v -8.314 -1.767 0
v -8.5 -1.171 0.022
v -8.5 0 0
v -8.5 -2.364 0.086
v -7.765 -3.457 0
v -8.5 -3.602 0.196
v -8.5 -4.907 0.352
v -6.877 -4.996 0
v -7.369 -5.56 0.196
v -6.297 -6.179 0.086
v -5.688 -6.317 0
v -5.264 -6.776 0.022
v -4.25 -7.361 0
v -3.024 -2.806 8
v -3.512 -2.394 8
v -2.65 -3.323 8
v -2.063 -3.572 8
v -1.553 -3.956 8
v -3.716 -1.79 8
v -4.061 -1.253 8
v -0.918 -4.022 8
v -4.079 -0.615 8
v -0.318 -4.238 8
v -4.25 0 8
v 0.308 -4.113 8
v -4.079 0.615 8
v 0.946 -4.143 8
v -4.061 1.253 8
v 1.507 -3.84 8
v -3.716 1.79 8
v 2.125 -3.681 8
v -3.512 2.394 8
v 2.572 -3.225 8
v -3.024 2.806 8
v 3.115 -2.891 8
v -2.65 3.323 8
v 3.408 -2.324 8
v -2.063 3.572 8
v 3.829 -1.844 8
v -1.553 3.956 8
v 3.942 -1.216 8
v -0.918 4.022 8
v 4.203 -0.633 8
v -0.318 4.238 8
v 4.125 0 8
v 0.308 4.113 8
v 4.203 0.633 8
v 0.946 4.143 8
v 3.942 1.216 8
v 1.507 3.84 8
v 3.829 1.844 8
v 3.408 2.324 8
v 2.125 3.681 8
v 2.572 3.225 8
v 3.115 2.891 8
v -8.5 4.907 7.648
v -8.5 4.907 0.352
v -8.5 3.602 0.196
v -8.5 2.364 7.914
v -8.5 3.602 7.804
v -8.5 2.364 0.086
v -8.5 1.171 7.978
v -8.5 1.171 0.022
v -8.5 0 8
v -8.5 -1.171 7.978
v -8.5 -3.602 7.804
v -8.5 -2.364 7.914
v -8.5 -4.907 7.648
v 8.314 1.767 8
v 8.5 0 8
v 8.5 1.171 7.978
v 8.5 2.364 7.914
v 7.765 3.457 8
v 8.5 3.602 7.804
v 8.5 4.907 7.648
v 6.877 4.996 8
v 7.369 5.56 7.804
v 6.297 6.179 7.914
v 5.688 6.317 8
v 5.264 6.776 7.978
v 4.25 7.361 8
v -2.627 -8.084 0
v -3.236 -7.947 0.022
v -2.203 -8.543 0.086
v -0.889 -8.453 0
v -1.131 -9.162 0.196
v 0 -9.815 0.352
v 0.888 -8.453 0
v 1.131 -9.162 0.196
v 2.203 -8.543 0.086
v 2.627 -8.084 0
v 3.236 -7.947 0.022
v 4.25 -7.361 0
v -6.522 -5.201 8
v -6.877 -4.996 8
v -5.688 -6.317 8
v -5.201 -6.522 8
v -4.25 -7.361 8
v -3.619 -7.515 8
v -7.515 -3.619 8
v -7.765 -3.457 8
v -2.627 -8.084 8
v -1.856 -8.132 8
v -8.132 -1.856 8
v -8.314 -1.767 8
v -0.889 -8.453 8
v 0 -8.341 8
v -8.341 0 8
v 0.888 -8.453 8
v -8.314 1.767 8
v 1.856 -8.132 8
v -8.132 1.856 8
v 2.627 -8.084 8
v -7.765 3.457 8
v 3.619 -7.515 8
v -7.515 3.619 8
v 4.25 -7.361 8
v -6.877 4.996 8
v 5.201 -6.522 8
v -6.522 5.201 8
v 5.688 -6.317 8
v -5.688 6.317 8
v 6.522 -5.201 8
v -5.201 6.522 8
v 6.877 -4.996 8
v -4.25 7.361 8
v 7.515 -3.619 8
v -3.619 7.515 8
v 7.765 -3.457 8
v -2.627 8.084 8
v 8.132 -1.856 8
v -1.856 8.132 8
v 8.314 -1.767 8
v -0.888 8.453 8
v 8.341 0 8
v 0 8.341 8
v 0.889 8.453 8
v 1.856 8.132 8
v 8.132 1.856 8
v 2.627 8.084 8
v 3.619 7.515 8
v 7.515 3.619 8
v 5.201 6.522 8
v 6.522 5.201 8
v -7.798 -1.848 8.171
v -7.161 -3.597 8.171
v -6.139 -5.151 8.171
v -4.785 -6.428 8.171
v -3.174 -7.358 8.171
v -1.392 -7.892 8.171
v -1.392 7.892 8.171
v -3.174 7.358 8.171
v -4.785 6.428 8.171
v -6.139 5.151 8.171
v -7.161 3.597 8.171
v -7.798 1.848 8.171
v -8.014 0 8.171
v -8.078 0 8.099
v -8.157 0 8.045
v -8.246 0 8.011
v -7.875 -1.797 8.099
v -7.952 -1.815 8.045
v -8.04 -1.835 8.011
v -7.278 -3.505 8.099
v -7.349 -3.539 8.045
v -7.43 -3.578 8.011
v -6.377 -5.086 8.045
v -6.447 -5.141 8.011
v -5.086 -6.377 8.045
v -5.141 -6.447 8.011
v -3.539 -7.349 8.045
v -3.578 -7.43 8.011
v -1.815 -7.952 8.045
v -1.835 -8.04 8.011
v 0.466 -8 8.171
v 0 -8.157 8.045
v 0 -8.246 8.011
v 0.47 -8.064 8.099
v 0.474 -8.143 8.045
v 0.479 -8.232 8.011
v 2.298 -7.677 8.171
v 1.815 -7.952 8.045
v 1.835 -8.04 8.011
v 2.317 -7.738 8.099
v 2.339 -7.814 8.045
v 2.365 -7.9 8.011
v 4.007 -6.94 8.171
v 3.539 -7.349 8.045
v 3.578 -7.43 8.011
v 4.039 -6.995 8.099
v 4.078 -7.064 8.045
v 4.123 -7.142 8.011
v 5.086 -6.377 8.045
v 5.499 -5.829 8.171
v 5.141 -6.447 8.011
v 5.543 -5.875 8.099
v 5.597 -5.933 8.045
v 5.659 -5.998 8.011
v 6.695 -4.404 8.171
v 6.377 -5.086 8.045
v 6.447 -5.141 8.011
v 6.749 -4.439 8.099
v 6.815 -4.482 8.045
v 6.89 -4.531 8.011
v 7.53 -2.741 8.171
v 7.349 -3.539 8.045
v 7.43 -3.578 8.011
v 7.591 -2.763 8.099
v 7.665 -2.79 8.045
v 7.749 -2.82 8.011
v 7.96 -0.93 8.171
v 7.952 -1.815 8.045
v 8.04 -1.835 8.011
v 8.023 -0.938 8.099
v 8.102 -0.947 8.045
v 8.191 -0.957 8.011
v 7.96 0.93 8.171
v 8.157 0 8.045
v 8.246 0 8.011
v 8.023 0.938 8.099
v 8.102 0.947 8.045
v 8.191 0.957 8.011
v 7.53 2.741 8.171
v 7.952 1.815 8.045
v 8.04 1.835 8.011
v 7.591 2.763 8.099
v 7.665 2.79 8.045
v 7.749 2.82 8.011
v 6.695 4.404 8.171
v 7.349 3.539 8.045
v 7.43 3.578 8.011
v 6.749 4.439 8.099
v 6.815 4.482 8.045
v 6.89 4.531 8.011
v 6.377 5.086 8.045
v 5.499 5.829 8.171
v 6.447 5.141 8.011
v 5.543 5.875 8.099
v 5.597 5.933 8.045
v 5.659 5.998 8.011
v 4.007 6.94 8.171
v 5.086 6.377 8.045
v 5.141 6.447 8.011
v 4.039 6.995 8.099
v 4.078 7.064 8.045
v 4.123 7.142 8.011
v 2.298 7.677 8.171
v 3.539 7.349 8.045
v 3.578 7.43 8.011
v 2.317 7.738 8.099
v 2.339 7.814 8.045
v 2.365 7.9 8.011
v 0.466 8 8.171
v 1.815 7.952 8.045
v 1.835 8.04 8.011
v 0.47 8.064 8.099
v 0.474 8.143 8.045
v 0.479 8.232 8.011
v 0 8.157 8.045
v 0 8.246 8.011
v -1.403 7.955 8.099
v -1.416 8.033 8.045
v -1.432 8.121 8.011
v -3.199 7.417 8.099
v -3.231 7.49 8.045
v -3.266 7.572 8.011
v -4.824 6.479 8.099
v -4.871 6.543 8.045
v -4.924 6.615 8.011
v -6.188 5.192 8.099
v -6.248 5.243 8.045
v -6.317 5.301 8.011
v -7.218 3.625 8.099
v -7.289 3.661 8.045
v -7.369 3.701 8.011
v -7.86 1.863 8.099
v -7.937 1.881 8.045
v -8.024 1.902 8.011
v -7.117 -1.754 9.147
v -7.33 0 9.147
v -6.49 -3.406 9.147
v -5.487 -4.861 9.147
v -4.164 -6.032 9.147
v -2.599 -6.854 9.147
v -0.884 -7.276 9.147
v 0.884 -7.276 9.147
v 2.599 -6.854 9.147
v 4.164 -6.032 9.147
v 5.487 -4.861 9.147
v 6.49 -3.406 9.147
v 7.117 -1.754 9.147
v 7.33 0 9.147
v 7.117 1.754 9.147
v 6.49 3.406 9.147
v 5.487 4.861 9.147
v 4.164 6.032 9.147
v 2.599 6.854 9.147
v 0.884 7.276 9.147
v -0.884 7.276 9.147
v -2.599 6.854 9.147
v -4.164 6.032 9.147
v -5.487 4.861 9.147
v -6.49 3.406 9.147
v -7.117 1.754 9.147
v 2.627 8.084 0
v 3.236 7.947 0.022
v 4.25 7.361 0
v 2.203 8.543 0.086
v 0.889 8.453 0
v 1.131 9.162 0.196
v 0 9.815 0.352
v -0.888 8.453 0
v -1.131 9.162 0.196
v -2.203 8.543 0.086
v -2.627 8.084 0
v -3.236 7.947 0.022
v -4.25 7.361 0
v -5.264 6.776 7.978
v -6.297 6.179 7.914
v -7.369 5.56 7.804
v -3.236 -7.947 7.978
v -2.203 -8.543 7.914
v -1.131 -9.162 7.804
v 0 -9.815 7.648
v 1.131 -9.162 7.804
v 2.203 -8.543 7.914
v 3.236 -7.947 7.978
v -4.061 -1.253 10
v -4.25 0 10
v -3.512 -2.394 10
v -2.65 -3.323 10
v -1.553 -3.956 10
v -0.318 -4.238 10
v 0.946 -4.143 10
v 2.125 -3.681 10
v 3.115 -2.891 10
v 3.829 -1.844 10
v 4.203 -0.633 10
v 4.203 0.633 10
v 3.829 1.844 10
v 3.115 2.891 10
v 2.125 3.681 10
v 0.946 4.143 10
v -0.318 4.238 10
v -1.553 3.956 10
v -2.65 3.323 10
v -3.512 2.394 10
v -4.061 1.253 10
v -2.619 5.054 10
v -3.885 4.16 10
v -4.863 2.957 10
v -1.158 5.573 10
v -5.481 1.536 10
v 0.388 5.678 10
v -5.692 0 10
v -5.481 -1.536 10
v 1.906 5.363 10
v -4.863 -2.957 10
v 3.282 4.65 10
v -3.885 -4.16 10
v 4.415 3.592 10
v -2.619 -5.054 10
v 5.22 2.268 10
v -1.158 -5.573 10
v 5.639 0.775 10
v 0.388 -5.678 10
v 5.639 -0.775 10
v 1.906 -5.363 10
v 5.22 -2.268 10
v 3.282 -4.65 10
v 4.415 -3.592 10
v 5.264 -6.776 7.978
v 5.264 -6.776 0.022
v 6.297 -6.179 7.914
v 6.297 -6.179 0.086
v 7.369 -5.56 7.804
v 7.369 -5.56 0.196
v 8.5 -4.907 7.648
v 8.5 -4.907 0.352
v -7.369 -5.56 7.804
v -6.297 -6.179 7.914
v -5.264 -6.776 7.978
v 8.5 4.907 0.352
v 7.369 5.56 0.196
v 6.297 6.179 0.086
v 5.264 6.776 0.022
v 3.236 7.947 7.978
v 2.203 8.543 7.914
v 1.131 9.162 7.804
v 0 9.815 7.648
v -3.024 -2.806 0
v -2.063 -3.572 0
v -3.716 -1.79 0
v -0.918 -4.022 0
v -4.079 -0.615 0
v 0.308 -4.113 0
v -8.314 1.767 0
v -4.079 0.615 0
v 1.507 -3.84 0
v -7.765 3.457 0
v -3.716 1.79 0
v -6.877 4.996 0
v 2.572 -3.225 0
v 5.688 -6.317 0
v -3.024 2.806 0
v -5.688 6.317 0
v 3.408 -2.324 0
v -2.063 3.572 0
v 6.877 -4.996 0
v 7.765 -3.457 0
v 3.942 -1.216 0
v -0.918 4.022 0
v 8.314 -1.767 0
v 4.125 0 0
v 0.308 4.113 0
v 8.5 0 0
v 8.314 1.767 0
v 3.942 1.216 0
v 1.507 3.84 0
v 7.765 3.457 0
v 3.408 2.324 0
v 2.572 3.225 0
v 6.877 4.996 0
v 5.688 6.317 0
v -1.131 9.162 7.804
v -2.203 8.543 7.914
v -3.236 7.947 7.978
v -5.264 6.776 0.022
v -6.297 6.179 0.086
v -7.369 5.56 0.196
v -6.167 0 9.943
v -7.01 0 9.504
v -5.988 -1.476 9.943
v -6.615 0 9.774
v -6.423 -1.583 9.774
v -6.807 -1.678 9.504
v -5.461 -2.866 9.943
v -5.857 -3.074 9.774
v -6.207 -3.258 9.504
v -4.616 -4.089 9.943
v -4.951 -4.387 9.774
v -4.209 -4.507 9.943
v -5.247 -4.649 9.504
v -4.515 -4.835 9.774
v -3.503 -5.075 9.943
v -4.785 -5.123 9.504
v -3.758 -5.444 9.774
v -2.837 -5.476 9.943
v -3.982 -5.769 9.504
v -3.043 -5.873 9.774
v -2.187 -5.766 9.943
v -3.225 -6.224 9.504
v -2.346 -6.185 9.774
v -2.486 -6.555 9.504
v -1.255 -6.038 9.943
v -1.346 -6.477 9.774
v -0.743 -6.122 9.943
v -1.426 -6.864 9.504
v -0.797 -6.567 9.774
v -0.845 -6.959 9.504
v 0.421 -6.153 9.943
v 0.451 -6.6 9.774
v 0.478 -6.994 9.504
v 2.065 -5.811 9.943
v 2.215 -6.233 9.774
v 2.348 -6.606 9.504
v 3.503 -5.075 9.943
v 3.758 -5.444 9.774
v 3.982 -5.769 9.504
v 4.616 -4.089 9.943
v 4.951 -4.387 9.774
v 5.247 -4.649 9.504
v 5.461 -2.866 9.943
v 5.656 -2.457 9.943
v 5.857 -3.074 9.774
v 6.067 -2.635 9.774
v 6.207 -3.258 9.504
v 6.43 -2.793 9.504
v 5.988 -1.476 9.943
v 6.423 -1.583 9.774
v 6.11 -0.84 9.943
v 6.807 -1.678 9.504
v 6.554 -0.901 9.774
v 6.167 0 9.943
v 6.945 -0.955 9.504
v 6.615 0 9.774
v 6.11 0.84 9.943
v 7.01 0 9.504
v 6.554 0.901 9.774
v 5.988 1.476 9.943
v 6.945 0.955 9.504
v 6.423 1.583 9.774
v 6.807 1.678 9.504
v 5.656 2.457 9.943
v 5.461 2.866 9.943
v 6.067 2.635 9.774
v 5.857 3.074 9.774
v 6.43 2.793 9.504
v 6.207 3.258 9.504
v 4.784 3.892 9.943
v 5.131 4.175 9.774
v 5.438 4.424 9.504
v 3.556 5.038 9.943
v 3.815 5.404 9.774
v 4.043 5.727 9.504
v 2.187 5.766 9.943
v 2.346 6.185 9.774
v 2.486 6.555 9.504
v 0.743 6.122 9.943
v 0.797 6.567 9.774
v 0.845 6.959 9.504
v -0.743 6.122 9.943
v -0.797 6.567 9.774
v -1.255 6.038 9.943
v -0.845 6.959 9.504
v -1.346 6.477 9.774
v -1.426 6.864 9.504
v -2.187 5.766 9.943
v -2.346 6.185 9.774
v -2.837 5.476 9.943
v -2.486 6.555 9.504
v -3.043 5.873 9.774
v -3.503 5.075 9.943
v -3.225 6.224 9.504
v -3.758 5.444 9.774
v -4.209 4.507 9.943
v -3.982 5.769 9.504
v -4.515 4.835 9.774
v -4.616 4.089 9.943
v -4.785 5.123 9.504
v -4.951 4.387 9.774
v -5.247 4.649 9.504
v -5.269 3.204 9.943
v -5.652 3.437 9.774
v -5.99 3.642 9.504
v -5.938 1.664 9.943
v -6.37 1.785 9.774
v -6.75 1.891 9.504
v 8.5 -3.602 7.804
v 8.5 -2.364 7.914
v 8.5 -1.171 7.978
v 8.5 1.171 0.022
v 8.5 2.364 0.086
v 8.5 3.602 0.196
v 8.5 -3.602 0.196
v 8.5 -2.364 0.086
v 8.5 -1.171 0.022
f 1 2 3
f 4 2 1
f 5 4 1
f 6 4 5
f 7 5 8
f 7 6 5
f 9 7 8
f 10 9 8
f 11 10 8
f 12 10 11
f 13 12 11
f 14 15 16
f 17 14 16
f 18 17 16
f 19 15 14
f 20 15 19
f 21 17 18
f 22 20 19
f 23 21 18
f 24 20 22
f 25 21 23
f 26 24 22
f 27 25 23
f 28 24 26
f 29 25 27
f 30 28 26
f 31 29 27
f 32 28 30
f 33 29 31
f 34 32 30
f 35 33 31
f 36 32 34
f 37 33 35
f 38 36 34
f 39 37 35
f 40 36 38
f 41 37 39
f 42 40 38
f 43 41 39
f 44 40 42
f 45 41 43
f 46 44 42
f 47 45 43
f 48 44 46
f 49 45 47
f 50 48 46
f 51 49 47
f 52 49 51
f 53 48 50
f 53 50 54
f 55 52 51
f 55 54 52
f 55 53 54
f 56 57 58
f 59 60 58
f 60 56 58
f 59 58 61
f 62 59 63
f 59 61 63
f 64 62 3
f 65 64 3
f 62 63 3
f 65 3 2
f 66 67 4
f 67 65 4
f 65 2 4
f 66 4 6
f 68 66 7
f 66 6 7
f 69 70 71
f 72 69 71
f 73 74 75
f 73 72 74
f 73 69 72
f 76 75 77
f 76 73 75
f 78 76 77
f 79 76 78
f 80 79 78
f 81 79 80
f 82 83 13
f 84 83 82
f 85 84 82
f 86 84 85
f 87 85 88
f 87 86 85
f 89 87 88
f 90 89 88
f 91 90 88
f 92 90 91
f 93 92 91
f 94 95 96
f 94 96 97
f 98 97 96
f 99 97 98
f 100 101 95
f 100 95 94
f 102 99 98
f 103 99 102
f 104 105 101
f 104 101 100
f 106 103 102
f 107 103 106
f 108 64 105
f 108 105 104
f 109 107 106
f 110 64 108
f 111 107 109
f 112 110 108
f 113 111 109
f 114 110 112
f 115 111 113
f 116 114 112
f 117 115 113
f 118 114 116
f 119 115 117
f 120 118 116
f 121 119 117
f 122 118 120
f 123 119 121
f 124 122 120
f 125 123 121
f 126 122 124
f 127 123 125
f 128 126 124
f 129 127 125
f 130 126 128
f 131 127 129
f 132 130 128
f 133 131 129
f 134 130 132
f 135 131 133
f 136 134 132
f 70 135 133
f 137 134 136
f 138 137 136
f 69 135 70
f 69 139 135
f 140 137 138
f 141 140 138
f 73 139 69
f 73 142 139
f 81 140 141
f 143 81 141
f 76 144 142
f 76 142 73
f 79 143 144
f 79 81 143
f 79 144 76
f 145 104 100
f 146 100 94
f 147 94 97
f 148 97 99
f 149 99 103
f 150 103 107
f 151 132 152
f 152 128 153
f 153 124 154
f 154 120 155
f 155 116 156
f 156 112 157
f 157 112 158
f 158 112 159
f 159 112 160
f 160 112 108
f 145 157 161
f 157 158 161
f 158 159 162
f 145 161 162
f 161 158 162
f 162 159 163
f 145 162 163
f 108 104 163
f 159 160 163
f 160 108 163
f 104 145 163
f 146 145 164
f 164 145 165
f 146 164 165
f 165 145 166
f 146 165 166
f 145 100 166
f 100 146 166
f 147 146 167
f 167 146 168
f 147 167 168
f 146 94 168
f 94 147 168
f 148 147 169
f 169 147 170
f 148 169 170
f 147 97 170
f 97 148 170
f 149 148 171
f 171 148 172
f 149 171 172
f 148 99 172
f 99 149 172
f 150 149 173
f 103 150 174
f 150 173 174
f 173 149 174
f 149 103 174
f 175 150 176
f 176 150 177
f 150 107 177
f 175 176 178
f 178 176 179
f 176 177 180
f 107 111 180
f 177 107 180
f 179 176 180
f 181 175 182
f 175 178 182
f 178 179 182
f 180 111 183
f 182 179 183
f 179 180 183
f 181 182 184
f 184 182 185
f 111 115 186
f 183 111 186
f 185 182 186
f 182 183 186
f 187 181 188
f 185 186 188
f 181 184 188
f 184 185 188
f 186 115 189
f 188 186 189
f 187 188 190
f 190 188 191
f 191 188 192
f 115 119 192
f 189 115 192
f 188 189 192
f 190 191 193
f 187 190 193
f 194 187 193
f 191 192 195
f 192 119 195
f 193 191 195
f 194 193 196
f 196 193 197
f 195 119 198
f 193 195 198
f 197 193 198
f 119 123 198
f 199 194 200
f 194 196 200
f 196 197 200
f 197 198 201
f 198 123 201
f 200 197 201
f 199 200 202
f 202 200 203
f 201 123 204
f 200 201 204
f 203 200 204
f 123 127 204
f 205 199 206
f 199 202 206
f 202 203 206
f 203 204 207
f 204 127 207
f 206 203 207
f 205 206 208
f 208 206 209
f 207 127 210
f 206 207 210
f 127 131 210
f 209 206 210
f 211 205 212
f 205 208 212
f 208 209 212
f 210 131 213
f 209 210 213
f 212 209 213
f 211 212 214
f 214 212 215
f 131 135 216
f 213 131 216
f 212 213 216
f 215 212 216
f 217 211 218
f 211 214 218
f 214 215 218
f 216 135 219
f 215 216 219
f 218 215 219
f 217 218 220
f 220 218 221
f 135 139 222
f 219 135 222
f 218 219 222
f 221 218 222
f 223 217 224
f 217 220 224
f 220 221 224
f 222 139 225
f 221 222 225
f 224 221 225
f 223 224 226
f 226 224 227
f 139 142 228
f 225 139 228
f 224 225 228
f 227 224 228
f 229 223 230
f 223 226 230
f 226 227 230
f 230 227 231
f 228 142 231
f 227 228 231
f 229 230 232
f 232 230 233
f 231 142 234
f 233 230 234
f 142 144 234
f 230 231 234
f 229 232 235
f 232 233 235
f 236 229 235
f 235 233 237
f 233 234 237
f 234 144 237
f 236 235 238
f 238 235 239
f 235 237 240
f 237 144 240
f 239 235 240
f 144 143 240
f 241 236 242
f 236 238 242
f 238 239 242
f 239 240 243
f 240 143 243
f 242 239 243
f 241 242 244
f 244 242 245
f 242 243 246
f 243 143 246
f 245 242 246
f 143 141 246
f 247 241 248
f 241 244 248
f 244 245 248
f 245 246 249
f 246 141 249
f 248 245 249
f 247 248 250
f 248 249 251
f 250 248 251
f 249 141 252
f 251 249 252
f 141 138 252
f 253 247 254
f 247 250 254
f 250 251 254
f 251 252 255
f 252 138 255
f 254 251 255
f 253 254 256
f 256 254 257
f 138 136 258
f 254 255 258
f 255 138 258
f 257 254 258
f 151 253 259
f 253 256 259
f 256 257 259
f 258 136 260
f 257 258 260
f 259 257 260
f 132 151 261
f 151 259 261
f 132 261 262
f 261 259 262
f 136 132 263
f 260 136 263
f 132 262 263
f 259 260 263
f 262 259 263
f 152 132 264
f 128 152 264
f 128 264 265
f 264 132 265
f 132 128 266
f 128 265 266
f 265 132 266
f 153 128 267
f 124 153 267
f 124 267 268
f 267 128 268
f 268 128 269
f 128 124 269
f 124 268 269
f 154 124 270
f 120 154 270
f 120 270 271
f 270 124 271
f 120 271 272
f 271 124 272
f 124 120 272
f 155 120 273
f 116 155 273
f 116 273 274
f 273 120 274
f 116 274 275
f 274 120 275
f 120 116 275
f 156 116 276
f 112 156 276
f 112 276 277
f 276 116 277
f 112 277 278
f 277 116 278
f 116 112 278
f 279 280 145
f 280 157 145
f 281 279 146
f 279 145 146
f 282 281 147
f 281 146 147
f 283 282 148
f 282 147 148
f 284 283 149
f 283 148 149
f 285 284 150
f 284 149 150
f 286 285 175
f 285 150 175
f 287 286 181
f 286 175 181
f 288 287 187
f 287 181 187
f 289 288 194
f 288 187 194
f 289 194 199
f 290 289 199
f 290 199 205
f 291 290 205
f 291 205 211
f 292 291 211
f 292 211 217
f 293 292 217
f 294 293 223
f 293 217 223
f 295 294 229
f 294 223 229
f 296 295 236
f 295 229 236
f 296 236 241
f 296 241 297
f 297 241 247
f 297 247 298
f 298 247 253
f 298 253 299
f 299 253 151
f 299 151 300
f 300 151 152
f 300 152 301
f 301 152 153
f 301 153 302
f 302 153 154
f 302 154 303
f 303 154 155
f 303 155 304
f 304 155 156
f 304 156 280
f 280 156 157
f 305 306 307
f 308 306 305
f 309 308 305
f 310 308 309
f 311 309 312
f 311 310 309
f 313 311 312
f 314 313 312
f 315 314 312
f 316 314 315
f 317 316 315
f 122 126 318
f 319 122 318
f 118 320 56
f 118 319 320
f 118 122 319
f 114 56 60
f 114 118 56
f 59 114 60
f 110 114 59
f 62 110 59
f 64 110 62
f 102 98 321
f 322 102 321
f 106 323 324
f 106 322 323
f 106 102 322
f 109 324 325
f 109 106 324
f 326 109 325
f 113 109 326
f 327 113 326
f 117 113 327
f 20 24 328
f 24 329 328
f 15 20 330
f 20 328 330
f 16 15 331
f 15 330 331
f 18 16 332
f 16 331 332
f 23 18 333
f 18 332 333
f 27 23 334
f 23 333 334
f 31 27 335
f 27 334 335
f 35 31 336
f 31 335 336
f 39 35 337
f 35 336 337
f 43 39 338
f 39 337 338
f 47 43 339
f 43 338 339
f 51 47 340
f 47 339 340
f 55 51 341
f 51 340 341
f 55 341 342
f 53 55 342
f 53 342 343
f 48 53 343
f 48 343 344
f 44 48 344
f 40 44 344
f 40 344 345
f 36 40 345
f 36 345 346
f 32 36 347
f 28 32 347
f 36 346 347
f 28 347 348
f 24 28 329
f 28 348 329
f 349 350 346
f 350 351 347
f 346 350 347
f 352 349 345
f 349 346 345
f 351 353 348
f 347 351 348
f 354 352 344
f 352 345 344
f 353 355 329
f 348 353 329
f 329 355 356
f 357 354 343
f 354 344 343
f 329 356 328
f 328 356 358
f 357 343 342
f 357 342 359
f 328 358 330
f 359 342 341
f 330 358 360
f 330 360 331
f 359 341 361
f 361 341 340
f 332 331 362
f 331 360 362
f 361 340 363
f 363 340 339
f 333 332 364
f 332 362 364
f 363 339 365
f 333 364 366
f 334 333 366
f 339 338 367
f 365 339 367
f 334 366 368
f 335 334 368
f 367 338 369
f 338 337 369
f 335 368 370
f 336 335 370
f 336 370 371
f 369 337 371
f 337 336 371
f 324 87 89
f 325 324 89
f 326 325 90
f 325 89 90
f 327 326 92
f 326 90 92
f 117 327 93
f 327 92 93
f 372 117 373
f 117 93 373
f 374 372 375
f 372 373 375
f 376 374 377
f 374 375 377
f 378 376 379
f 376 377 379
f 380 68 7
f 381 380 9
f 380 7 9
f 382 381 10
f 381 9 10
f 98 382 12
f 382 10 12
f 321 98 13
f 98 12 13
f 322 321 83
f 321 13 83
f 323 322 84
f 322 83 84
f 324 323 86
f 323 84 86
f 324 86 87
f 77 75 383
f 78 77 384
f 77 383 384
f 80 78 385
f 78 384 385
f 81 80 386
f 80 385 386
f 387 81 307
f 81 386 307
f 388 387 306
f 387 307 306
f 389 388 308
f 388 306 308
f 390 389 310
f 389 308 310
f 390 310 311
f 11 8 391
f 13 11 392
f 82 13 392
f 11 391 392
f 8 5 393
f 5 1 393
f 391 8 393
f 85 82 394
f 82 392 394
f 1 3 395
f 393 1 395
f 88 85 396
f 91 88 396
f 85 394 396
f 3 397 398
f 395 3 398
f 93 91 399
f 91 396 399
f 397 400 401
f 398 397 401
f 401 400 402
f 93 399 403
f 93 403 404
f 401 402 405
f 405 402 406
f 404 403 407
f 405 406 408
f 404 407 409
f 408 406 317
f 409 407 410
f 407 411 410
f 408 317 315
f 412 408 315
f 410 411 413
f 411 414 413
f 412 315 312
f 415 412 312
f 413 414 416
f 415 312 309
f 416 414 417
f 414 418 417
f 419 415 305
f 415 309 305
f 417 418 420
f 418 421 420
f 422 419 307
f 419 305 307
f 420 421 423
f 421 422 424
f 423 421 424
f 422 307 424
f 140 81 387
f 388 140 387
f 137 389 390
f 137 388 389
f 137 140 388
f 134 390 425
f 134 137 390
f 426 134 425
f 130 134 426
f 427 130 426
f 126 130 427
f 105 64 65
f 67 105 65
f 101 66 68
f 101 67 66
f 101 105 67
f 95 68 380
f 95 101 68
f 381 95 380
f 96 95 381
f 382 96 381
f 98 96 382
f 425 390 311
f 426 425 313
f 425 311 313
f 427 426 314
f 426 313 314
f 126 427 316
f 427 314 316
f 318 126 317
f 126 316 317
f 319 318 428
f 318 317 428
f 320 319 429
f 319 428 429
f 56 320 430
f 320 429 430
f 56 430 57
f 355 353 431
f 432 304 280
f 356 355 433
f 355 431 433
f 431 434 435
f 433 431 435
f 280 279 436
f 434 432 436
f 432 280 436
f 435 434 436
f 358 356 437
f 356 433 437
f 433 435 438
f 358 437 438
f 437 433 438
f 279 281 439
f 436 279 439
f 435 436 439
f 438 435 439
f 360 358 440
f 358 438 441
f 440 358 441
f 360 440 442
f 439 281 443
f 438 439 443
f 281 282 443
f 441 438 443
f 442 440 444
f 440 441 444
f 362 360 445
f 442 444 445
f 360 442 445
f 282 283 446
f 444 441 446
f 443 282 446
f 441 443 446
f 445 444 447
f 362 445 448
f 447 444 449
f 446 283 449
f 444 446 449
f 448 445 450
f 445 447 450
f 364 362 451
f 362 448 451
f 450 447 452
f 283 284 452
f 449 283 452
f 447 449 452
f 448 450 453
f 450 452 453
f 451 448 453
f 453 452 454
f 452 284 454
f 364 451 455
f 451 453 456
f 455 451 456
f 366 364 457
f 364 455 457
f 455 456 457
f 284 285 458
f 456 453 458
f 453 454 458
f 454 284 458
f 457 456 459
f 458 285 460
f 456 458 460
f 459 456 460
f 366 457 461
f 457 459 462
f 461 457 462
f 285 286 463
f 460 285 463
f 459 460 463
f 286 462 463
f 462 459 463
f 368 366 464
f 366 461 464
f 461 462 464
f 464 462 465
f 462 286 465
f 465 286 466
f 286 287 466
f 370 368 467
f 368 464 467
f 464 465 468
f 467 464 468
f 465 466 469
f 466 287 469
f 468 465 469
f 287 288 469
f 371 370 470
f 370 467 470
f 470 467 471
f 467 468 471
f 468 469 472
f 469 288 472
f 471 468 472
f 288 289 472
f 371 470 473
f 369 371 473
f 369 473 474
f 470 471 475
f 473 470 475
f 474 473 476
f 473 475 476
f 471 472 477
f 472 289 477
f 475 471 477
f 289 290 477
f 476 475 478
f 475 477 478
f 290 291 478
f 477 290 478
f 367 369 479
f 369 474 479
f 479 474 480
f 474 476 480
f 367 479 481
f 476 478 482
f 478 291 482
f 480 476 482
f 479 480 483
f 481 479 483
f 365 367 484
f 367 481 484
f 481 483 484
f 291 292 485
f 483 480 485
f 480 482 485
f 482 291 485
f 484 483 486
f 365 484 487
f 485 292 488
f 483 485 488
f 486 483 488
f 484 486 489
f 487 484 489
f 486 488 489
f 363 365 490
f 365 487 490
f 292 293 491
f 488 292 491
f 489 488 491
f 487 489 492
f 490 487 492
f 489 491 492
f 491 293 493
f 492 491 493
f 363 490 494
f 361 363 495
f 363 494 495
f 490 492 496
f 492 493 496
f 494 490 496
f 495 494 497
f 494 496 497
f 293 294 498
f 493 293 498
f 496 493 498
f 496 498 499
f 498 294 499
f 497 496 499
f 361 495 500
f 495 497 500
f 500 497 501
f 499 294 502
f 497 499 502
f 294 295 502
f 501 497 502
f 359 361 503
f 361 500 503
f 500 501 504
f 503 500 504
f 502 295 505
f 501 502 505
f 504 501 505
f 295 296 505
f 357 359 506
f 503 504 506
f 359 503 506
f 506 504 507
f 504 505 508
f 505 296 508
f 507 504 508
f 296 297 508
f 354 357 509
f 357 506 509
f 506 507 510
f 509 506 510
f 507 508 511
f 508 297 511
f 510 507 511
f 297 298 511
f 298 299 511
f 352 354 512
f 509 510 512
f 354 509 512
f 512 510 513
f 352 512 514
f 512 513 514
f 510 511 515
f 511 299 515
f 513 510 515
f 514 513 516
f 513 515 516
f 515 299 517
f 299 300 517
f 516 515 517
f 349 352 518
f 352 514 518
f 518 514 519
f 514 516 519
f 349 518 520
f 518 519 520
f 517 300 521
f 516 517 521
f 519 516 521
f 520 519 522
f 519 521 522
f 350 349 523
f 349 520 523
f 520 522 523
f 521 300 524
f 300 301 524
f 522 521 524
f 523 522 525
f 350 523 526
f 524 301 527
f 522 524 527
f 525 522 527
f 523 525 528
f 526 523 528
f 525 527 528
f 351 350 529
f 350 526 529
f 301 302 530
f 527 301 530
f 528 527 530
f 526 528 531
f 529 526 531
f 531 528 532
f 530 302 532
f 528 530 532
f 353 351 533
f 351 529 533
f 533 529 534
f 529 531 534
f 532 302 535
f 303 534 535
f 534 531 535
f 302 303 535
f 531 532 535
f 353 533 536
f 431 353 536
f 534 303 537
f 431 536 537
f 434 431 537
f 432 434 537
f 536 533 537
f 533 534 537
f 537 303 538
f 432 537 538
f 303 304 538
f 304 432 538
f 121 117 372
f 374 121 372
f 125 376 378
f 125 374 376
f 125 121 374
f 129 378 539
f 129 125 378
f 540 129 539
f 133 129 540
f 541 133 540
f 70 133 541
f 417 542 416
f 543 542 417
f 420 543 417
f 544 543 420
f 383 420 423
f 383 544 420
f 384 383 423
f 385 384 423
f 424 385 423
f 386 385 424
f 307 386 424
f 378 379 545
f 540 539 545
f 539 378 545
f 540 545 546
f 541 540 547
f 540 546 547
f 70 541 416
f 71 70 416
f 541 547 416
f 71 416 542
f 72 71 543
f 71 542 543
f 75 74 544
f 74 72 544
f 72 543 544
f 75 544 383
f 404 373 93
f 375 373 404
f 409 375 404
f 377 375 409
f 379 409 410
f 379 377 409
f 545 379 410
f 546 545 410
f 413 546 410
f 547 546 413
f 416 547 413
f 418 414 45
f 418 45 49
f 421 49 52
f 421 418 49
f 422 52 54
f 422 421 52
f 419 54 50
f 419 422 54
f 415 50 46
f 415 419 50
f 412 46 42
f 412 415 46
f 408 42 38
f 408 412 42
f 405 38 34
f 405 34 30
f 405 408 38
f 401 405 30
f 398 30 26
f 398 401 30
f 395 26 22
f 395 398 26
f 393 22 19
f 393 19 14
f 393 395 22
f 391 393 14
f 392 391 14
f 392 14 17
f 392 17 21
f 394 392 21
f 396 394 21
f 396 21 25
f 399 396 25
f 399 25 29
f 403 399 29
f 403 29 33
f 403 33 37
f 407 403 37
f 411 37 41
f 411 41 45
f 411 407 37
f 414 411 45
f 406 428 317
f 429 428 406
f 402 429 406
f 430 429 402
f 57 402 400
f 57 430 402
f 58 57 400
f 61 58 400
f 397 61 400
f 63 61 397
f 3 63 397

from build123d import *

# Parameters (mm, degrees)
F0_R     = 4.125
F1_DEPTH = 8


with BuildPart() as f1:
    # F0 (on Top) → F1 (new body)
    with BuildSketch(Plane.XY):
        Polygon((8.5, -4.9074772881), (8.5, 4.9074772881), (0, 9.8149545762), (-8.5, 4.9074772881), (-8.5, -4.9074772881), (0, -9.8149545762), align=None)
        Circle(F0_R, mode=Mode.SUBTRACT)
    extrude(amount=F1_DEPTH)

    # F5 (on 3pt) → F6 (revolve, cut)
    with BuildSketch(Plane(origin=(0, 0, 0), x_dir=(0.8660254038, 0.5, 0), z_dir=(0.5, -0.8660254038, 0))):
        Polygon((-15.315942407, 9.5), (-15.315942407, 6.1736737364), (-2.9019237886, 9.5), align=None)
        Polygon((-15.315942407, -1.5), (-2.9019237886, -1.5), (-15.315942407, 1.8263262636), align=None)
    revolve(axis=Axis((0, 0, 4.2626714858), (0, 0, 1)), mode=Mode.SUBTRACT)

    # F7 (on Front) → F8 (revolve)
    with BuildSketch(Plane.XZ):
        with BuildLine():
            Line((-8.34139258, 8), (-4.25, 8))
            Line((-4.25, 8), (-4.25, 10))
            Line((-4.25, 10), (-5.6916165822, 10))
            ThreePointArc((-5.6916165822, 10), (-6.6151138087, 9.7740216664), (-7.3299206708, 9.1471528727))
            Line((-7.3299206708, 9.1471528727), (-8.0137317623, 8.1705694255))
            ThreePointArc((-8.0137317623, 8.1705694255), (-8.1566931347, 8.0451956667), (-8.34139258, 8))
        make_face()
    revolve(axis=Axis((0, 0, 4.2626714858), (0, 0, 1)))


solid = f1.part
